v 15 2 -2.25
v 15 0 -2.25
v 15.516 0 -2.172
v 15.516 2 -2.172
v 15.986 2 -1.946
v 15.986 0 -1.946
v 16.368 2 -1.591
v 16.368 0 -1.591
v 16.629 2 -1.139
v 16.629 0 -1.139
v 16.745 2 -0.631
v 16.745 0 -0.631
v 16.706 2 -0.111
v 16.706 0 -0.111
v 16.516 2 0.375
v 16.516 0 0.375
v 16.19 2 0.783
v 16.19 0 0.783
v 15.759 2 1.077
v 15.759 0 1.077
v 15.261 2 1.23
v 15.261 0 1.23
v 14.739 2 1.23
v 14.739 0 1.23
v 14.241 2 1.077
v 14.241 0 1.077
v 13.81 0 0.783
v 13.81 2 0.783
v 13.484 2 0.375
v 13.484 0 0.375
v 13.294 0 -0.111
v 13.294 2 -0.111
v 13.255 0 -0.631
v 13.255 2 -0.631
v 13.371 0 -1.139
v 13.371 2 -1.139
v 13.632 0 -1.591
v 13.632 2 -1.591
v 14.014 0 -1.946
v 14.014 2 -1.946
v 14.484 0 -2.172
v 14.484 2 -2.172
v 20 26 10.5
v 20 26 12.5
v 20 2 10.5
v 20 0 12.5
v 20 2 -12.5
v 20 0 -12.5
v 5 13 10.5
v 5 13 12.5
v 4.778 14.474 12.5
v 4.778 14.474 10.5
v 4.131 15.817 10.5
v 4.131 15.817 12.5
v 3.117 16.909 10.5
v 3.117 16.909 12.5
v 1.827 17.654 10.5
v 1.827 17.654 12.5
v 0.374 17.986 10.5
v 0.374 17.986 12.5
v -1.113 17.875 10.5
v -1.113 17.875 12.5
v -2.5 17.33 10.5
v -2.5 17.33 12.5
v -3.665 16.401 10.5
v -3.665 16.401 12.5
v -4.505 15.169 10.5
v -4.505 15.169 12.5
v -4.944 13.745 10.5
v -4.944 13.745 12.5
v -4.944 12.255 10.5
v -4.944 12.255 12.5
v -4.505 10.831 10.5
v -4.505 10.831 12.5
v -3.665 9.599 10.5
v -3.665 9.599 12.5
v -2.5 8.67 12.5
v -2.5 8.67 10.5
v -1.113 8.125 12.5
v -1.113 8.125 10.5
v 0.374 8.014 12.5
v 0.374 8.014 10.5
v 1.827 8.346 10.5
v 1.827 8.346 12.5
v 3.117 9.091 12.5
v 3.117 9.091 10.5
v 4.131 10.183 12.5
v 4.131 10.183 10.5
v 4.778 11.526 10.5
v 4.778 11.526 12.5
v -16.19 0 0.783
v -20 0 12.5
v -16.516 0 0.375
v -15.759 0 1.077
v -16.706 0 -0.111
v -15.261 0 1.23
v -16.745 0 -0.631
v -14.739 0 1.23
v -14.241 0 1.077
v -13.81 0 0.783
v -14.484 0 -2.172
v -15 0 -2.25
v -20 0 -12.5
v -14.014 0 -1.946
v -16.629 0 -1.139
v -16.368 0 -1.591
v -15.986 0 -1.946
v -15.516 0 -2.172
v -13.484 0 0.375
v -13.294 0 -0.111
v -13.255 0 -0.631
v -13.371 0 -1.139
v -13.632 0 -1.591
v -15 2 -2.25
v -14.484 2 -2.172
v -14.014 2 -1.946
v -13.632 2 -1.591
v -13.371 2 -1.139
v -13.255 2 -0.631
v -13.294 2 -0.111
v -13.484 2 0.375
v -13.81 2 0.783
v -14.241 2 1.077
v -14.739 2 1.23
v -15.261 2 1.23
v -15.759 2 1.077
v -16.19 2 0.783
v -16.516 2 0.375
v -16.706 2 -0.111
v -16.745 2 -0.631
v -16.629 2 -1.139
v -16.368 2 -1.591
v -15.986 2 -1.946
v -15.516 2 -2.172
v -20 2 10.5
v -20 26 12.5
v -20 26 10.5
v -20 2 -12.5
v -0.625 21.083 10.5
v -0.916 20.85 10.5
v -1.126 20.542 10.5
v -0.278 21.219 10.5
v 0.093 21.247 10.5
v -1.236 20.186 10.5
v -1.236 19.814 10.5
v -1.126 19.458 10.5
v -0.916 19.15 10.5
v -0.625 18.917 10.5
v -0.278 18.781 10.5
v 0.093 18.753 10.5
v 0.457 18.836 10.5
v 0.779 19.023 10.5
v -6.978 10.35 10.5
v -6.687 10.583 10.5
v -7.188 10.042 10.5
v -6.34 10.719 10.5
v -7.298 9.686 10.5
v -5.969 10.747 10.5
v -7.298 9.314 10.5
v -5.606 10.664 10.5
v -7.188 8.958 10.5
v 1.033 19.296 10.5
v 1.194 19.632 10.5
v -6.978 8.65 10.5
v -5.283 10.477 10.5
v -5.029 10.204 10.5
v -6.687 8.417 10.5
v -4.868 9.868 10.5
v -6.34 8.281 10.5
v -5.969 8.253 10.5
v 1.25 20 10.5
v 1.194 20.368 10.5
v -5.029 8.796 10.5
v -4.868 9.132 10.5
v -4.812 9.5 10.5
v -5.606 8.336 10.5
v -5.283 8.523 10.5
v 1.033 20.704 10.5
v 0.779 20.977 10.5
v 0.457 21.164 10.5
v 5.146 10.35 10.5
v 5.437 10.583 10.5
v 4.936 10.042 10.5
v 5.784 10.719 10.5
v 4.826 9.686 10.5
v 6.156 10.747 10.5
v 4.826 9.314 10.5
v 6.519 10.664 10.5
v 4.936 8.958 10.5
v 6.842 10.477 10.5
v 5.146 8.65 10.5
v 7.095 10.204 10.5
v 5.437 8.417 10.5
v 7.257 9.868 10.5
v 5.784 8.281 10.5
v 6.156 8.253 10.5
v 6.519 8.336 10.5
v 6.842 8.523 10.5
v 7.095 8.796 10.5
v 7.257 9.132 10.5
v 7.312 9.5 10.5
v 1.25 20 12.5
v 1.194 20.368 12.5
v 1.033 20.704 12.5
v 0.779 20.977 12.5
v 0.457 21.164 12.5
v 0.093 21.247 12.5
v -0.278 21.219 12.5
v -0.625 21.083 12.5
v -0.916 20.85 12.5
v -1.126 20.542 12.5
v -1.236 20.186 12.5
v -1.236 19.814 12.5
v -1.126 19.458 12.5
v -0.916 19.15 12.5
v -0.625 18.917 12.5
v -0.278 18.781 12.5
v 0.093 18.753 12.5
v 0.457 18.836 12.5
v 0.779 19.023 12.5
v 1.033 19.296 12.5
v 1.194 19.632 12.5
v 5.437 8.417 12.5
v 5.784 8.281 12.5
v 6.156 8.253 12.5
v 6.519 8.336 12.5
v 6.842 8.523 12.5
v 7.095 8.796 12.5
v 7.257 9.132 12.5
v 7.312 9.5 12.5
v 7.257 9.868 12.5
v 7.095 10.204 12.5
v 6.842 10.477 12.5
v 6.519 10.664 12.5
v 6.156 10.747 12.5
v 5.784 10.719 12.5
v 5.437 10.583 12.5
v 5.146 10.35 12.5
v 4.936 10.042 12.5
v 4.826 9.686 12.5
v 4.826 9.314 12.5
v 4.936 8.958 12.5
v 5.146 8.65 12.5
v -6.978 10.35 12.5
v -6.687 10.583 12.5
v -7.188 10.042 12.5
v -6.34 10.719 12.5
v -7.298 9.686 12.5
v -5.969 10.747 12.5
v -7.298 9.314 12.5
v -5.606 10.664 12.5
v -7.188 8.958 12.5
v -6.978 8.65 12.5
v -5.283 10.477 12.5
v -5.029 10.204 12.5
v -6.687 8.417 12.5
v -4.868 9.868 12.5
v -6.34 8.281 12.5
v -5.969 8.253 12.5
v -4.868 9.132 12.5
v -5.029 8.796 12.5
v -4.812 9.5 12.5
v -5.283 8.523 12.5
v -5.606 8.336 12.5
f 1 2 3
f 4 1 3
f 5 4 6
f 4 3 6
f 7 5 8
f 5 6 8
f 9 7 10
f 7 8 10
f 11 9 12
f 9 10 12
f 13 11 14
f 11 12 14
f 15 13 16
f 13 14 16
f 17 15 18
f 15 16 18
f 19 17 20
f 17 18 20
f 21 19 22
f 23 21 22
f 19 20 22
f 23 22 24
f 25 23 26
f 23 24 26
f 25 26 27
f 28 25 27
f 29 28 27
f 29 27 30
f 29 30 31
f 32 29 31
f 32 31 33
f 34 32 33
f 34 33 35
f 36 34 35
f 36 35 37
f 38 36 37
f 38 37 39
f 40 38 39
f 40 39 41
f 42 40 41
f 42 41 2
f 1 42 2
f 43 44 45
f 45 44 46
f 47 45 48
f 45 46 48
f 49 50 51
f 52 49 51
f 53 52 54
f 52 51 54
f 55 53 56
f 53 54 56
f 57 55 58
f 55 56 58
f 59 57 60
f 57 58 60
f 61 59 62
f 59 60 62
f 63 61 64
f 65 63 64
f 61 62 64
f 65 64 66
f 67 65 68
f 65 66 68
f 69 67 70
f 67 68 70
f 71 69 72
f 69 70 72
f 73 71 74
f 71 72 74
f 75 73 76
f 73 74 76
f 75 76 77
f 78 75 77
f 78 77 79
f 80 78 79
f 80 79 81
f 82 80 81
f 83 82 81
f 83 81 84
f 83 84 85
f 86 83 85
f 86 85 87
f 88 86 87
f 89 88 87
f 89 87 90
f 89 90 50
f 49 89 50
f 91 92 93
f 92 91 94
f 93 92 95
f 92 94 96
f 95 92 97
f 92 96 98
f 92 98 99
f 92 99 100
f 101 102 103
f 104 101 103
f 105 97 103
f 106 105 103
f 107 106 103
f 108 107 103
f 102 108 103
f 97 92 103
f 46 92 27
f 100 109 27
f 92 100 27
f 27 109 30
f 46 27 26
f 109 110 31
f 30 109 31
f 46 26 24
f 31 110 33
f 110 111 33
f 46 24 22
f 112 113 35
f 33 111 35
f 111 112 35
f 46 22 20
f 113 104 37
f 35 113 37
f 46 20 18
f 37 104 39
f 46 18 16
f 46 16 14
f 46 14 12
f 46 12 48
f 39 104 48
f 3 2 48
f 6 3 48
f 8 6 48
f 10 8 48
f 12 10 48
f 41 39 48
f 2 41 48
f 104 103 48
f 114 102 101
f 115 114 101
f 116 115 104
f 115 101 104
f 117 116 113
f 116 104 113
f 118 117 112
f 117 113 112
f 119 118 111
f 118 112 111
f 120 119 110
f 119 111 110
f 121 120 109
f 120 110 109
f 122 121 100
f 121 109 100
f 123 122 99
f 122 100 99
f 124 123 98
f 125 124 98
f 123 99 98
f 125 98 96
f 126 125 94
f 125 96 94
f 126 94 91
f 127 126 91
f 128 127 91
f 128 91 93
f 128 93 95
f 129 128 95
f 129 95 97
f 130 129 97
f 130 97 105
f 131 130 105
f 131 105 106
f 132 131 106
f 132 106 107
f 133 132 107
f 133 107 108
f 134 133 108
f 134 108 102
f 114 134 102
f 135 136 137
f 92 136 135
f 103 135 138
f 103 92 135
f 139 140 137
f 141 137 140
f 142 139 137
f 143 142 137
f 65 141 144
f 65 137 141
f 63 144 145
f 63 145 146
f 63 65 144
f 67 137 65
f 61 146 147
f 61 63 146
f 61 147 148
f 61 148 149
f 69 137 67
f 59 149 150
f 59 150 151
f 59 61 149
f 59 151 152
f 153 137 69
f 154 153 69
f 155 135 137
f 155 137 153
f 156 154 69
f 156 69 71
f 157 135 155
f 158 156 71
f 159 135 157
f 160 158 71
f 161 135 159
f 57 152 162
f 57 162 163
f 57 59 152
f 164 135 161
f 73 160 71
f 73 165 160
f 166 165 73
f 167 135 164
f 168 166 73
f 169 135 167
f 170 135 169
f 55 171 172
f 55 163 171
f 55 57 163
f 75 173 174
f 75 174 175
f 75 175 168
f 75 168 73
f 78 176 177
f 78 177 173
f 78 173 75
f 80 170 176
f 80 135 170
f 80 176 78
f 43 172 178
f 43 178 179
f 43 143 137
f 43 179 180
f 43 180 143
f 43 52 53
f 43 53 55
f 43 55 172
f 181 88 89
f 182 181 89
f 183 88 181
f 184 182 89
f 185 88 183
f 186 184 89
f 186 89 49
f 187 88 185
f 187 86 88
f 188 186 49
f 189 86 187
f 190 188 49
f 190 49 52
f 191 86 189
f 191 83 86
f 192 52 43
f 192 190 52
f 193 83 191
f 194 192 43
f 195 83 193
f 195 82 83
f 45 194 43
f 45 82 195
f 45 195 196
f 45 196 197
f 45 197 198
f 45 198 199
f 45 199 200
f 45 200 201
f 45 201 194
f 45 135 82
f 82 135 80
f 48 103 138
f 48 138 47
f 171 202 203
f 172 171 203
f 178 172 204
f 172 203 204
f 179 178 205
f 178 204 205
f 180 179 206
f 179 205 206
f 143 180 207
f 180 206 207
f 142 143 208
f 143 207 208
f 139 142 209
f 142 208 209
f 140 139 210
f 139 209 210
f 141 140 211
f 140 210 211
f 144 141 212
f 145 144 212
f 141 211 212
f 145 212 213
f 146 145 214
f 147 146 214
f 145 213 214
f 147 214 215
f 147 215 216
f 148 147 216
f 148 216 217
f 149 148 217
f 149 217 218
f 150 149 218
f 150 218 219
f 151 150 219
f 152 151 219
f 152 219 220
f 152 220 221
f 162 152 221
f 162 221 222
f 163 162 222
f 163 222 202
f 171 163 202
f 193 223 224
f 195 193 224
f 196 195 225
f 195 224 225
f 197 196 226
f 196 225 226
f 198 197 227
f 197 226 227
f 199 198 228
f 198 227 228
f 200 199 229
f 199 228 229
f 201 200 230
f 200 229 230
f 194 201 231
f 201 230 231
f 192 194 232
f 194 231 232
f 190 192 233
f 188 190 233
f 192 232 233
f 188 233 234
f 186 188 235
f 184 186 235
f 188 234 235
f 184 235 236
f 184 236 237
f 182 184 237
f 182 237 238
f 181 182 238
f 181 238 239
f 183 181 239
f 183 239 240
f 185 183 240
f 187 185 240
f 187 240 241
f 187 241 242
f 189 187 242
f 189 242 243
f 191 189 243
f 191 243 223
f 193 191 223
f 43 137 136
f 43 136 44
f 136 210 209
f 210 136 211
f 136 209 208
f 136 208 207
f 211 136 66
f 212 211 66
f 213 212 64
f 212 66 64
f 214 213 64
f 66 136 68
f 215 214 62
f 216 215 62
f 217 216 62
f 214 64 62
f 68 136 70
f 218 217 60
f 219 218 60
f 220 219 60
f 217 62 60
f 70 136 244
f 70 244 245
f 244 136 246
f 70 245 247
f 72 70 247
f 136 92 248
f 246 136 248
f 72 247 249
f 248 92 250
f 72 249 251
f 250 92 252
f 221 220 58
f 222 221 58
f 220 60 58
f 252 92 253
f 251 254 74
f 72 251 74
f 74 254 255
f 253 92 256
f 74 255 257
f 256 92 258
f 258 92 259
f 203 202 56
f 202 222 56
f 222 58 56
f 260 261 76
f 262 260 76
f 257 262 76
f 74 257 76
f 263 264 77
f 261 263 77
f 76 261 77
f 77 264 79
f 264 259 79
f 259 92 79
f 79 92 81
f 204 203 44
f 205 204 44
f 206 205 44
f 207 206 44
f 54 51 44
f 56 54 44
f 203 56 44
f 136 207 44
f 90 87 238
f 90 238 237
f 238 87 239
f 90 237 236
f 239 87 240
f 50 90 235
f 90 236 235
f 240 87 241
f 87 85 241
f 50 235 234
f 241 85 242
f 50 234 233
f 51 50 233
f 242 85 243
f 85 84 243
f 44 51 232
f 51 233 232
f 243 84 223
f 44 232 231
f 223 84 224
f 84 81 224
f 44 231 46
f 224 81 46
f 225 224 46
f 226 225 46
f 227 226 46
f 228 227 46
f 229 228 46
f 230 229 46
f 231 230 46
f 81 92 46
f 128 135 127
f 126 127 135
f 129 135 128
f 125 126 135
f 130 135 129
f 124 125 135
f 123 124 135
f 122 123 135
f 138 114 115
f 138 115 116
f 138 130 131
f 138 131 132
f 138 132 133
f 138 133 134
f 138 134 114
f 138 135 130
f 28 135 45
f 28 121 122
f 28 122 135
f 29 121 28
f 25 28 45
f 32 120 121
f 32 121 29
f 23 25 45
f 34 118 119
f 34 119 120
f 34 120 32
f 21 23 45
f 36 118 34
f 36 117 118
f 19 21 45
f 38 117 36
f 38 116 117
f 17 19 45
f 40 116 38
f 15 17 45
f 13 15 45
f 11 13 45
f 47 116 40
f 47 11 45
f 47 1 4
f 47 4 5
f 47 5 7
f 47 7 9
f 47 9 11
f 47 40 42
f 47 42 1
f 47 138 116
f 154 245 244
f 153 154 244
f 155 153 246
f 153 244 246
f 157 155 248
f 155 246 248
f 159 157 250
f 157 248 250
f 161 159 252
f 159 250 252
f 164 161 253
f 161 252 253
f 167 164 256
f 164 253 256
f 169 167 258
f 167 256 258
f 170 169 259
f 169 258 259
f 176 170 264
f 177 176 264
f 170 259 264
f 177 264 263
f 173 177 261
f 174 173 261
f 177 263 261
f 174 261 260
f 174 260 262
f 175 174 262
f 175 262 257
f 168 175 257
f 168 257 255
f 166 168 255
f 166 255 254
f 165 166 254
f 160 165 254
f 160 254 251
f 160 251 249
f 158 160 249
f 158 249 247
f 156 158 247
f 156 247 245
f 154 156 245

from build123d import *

# Parameters (mm, degrees)
SKETCH1_W           = 40
SKETCH1_H           = 25
BOSS_EXTRUDE1_DEPTH = 2
SKETCH2_W           = 40
SKETCH2_H           = 2
BOSS_EXTRUDE2_DEPTH = 24
SKETCH3_R           = 1.75
CUT_EXTRUDE1_DEPTH  = 36.103418637
SKETCH5_R           = 5
CUT_EXTRUDE2_DEPTH  = 42.243181255
SKETCH6_R           = 1.25
CUT_EXTRUDE3_DEPTH  = 42.243181255
CIRPATTERN1_COUNT   = 3


with BuildPart() as part:
    # Sketch1 → Boss-Extrude1 (new body)
    with BuildSketch(Plane(origin=(0, 0, 0), x_dir=(1, 0, 0), z_dir=(0, 1, 0))):
        Rectangle(SKETCH1_W, SKETCH1_H)
    extrude(amount=BOSS_EXTRUDE1_DEPTH)

    # Sketch2 → Boss-Extrude2 (add)
    with BuildSketch(Plane(origin=(0, 2, 0), x_dir=(1, 0, 0), z_dir=(0, 1, 0))):
        with Locations((0, -11.5)):
            Rectangle(SKETCH2_W, SKETCH2_H)
    extrude(amount=BOSS_EXTRUDE2_DEPTH)

    # Sketch3 → Cut-Extrude1 (cut, through all)
    with BuildSketch(Plane.XZ):
        with Locations(Location((-15, -0.5, 0), (0, 0, 270))):
            Circle(SKETCH3_R)
        with Locations(Location((15, -0.5, 0), (0, 0, 270))):
            Circle(SKETCH3_R)
    extrude(amount=-CUT_EXTRUDE1_DEPTH, mode=Mode.SUBTRACT)

    # Sketch5 → Cut-Extrude2 (cut, through all)
    with BuildSketch(Plane.XY.offset(12.5)):
        with Locations((0, 13)):
            Circle(SKETCH5_R)
    extrude(amount=-CUT_EXTRUDE2_DEPTH, mode=Mode.SUBTRACT)

    # Sketch6 → Cut-Extrude3 (cut, through all)
    with BuildSketch(Plane.XY.offset(12.5)):
        with Locations((0, 20)):
            Circle(SKETCH6_R)
    cut_extrude3 = extrude(amount=-CUT_EXTRUDE3_DEPTH, mode=Mode.SUBTRACT)

    # CirPattern1: Cut-Extrude3 ×3 about axis
    cirpattern1_axis = Axis((0, 13, 0), (0, 0, 1))
    for i in range(1, CIRPATTERN1_COUNT):
        add(cut_extrude3.rotate(cirpattern1_axis, i * 360 / CIRPATTERN1_COUNT), mode=Mode.SUBTRACT)


solid = part.part
